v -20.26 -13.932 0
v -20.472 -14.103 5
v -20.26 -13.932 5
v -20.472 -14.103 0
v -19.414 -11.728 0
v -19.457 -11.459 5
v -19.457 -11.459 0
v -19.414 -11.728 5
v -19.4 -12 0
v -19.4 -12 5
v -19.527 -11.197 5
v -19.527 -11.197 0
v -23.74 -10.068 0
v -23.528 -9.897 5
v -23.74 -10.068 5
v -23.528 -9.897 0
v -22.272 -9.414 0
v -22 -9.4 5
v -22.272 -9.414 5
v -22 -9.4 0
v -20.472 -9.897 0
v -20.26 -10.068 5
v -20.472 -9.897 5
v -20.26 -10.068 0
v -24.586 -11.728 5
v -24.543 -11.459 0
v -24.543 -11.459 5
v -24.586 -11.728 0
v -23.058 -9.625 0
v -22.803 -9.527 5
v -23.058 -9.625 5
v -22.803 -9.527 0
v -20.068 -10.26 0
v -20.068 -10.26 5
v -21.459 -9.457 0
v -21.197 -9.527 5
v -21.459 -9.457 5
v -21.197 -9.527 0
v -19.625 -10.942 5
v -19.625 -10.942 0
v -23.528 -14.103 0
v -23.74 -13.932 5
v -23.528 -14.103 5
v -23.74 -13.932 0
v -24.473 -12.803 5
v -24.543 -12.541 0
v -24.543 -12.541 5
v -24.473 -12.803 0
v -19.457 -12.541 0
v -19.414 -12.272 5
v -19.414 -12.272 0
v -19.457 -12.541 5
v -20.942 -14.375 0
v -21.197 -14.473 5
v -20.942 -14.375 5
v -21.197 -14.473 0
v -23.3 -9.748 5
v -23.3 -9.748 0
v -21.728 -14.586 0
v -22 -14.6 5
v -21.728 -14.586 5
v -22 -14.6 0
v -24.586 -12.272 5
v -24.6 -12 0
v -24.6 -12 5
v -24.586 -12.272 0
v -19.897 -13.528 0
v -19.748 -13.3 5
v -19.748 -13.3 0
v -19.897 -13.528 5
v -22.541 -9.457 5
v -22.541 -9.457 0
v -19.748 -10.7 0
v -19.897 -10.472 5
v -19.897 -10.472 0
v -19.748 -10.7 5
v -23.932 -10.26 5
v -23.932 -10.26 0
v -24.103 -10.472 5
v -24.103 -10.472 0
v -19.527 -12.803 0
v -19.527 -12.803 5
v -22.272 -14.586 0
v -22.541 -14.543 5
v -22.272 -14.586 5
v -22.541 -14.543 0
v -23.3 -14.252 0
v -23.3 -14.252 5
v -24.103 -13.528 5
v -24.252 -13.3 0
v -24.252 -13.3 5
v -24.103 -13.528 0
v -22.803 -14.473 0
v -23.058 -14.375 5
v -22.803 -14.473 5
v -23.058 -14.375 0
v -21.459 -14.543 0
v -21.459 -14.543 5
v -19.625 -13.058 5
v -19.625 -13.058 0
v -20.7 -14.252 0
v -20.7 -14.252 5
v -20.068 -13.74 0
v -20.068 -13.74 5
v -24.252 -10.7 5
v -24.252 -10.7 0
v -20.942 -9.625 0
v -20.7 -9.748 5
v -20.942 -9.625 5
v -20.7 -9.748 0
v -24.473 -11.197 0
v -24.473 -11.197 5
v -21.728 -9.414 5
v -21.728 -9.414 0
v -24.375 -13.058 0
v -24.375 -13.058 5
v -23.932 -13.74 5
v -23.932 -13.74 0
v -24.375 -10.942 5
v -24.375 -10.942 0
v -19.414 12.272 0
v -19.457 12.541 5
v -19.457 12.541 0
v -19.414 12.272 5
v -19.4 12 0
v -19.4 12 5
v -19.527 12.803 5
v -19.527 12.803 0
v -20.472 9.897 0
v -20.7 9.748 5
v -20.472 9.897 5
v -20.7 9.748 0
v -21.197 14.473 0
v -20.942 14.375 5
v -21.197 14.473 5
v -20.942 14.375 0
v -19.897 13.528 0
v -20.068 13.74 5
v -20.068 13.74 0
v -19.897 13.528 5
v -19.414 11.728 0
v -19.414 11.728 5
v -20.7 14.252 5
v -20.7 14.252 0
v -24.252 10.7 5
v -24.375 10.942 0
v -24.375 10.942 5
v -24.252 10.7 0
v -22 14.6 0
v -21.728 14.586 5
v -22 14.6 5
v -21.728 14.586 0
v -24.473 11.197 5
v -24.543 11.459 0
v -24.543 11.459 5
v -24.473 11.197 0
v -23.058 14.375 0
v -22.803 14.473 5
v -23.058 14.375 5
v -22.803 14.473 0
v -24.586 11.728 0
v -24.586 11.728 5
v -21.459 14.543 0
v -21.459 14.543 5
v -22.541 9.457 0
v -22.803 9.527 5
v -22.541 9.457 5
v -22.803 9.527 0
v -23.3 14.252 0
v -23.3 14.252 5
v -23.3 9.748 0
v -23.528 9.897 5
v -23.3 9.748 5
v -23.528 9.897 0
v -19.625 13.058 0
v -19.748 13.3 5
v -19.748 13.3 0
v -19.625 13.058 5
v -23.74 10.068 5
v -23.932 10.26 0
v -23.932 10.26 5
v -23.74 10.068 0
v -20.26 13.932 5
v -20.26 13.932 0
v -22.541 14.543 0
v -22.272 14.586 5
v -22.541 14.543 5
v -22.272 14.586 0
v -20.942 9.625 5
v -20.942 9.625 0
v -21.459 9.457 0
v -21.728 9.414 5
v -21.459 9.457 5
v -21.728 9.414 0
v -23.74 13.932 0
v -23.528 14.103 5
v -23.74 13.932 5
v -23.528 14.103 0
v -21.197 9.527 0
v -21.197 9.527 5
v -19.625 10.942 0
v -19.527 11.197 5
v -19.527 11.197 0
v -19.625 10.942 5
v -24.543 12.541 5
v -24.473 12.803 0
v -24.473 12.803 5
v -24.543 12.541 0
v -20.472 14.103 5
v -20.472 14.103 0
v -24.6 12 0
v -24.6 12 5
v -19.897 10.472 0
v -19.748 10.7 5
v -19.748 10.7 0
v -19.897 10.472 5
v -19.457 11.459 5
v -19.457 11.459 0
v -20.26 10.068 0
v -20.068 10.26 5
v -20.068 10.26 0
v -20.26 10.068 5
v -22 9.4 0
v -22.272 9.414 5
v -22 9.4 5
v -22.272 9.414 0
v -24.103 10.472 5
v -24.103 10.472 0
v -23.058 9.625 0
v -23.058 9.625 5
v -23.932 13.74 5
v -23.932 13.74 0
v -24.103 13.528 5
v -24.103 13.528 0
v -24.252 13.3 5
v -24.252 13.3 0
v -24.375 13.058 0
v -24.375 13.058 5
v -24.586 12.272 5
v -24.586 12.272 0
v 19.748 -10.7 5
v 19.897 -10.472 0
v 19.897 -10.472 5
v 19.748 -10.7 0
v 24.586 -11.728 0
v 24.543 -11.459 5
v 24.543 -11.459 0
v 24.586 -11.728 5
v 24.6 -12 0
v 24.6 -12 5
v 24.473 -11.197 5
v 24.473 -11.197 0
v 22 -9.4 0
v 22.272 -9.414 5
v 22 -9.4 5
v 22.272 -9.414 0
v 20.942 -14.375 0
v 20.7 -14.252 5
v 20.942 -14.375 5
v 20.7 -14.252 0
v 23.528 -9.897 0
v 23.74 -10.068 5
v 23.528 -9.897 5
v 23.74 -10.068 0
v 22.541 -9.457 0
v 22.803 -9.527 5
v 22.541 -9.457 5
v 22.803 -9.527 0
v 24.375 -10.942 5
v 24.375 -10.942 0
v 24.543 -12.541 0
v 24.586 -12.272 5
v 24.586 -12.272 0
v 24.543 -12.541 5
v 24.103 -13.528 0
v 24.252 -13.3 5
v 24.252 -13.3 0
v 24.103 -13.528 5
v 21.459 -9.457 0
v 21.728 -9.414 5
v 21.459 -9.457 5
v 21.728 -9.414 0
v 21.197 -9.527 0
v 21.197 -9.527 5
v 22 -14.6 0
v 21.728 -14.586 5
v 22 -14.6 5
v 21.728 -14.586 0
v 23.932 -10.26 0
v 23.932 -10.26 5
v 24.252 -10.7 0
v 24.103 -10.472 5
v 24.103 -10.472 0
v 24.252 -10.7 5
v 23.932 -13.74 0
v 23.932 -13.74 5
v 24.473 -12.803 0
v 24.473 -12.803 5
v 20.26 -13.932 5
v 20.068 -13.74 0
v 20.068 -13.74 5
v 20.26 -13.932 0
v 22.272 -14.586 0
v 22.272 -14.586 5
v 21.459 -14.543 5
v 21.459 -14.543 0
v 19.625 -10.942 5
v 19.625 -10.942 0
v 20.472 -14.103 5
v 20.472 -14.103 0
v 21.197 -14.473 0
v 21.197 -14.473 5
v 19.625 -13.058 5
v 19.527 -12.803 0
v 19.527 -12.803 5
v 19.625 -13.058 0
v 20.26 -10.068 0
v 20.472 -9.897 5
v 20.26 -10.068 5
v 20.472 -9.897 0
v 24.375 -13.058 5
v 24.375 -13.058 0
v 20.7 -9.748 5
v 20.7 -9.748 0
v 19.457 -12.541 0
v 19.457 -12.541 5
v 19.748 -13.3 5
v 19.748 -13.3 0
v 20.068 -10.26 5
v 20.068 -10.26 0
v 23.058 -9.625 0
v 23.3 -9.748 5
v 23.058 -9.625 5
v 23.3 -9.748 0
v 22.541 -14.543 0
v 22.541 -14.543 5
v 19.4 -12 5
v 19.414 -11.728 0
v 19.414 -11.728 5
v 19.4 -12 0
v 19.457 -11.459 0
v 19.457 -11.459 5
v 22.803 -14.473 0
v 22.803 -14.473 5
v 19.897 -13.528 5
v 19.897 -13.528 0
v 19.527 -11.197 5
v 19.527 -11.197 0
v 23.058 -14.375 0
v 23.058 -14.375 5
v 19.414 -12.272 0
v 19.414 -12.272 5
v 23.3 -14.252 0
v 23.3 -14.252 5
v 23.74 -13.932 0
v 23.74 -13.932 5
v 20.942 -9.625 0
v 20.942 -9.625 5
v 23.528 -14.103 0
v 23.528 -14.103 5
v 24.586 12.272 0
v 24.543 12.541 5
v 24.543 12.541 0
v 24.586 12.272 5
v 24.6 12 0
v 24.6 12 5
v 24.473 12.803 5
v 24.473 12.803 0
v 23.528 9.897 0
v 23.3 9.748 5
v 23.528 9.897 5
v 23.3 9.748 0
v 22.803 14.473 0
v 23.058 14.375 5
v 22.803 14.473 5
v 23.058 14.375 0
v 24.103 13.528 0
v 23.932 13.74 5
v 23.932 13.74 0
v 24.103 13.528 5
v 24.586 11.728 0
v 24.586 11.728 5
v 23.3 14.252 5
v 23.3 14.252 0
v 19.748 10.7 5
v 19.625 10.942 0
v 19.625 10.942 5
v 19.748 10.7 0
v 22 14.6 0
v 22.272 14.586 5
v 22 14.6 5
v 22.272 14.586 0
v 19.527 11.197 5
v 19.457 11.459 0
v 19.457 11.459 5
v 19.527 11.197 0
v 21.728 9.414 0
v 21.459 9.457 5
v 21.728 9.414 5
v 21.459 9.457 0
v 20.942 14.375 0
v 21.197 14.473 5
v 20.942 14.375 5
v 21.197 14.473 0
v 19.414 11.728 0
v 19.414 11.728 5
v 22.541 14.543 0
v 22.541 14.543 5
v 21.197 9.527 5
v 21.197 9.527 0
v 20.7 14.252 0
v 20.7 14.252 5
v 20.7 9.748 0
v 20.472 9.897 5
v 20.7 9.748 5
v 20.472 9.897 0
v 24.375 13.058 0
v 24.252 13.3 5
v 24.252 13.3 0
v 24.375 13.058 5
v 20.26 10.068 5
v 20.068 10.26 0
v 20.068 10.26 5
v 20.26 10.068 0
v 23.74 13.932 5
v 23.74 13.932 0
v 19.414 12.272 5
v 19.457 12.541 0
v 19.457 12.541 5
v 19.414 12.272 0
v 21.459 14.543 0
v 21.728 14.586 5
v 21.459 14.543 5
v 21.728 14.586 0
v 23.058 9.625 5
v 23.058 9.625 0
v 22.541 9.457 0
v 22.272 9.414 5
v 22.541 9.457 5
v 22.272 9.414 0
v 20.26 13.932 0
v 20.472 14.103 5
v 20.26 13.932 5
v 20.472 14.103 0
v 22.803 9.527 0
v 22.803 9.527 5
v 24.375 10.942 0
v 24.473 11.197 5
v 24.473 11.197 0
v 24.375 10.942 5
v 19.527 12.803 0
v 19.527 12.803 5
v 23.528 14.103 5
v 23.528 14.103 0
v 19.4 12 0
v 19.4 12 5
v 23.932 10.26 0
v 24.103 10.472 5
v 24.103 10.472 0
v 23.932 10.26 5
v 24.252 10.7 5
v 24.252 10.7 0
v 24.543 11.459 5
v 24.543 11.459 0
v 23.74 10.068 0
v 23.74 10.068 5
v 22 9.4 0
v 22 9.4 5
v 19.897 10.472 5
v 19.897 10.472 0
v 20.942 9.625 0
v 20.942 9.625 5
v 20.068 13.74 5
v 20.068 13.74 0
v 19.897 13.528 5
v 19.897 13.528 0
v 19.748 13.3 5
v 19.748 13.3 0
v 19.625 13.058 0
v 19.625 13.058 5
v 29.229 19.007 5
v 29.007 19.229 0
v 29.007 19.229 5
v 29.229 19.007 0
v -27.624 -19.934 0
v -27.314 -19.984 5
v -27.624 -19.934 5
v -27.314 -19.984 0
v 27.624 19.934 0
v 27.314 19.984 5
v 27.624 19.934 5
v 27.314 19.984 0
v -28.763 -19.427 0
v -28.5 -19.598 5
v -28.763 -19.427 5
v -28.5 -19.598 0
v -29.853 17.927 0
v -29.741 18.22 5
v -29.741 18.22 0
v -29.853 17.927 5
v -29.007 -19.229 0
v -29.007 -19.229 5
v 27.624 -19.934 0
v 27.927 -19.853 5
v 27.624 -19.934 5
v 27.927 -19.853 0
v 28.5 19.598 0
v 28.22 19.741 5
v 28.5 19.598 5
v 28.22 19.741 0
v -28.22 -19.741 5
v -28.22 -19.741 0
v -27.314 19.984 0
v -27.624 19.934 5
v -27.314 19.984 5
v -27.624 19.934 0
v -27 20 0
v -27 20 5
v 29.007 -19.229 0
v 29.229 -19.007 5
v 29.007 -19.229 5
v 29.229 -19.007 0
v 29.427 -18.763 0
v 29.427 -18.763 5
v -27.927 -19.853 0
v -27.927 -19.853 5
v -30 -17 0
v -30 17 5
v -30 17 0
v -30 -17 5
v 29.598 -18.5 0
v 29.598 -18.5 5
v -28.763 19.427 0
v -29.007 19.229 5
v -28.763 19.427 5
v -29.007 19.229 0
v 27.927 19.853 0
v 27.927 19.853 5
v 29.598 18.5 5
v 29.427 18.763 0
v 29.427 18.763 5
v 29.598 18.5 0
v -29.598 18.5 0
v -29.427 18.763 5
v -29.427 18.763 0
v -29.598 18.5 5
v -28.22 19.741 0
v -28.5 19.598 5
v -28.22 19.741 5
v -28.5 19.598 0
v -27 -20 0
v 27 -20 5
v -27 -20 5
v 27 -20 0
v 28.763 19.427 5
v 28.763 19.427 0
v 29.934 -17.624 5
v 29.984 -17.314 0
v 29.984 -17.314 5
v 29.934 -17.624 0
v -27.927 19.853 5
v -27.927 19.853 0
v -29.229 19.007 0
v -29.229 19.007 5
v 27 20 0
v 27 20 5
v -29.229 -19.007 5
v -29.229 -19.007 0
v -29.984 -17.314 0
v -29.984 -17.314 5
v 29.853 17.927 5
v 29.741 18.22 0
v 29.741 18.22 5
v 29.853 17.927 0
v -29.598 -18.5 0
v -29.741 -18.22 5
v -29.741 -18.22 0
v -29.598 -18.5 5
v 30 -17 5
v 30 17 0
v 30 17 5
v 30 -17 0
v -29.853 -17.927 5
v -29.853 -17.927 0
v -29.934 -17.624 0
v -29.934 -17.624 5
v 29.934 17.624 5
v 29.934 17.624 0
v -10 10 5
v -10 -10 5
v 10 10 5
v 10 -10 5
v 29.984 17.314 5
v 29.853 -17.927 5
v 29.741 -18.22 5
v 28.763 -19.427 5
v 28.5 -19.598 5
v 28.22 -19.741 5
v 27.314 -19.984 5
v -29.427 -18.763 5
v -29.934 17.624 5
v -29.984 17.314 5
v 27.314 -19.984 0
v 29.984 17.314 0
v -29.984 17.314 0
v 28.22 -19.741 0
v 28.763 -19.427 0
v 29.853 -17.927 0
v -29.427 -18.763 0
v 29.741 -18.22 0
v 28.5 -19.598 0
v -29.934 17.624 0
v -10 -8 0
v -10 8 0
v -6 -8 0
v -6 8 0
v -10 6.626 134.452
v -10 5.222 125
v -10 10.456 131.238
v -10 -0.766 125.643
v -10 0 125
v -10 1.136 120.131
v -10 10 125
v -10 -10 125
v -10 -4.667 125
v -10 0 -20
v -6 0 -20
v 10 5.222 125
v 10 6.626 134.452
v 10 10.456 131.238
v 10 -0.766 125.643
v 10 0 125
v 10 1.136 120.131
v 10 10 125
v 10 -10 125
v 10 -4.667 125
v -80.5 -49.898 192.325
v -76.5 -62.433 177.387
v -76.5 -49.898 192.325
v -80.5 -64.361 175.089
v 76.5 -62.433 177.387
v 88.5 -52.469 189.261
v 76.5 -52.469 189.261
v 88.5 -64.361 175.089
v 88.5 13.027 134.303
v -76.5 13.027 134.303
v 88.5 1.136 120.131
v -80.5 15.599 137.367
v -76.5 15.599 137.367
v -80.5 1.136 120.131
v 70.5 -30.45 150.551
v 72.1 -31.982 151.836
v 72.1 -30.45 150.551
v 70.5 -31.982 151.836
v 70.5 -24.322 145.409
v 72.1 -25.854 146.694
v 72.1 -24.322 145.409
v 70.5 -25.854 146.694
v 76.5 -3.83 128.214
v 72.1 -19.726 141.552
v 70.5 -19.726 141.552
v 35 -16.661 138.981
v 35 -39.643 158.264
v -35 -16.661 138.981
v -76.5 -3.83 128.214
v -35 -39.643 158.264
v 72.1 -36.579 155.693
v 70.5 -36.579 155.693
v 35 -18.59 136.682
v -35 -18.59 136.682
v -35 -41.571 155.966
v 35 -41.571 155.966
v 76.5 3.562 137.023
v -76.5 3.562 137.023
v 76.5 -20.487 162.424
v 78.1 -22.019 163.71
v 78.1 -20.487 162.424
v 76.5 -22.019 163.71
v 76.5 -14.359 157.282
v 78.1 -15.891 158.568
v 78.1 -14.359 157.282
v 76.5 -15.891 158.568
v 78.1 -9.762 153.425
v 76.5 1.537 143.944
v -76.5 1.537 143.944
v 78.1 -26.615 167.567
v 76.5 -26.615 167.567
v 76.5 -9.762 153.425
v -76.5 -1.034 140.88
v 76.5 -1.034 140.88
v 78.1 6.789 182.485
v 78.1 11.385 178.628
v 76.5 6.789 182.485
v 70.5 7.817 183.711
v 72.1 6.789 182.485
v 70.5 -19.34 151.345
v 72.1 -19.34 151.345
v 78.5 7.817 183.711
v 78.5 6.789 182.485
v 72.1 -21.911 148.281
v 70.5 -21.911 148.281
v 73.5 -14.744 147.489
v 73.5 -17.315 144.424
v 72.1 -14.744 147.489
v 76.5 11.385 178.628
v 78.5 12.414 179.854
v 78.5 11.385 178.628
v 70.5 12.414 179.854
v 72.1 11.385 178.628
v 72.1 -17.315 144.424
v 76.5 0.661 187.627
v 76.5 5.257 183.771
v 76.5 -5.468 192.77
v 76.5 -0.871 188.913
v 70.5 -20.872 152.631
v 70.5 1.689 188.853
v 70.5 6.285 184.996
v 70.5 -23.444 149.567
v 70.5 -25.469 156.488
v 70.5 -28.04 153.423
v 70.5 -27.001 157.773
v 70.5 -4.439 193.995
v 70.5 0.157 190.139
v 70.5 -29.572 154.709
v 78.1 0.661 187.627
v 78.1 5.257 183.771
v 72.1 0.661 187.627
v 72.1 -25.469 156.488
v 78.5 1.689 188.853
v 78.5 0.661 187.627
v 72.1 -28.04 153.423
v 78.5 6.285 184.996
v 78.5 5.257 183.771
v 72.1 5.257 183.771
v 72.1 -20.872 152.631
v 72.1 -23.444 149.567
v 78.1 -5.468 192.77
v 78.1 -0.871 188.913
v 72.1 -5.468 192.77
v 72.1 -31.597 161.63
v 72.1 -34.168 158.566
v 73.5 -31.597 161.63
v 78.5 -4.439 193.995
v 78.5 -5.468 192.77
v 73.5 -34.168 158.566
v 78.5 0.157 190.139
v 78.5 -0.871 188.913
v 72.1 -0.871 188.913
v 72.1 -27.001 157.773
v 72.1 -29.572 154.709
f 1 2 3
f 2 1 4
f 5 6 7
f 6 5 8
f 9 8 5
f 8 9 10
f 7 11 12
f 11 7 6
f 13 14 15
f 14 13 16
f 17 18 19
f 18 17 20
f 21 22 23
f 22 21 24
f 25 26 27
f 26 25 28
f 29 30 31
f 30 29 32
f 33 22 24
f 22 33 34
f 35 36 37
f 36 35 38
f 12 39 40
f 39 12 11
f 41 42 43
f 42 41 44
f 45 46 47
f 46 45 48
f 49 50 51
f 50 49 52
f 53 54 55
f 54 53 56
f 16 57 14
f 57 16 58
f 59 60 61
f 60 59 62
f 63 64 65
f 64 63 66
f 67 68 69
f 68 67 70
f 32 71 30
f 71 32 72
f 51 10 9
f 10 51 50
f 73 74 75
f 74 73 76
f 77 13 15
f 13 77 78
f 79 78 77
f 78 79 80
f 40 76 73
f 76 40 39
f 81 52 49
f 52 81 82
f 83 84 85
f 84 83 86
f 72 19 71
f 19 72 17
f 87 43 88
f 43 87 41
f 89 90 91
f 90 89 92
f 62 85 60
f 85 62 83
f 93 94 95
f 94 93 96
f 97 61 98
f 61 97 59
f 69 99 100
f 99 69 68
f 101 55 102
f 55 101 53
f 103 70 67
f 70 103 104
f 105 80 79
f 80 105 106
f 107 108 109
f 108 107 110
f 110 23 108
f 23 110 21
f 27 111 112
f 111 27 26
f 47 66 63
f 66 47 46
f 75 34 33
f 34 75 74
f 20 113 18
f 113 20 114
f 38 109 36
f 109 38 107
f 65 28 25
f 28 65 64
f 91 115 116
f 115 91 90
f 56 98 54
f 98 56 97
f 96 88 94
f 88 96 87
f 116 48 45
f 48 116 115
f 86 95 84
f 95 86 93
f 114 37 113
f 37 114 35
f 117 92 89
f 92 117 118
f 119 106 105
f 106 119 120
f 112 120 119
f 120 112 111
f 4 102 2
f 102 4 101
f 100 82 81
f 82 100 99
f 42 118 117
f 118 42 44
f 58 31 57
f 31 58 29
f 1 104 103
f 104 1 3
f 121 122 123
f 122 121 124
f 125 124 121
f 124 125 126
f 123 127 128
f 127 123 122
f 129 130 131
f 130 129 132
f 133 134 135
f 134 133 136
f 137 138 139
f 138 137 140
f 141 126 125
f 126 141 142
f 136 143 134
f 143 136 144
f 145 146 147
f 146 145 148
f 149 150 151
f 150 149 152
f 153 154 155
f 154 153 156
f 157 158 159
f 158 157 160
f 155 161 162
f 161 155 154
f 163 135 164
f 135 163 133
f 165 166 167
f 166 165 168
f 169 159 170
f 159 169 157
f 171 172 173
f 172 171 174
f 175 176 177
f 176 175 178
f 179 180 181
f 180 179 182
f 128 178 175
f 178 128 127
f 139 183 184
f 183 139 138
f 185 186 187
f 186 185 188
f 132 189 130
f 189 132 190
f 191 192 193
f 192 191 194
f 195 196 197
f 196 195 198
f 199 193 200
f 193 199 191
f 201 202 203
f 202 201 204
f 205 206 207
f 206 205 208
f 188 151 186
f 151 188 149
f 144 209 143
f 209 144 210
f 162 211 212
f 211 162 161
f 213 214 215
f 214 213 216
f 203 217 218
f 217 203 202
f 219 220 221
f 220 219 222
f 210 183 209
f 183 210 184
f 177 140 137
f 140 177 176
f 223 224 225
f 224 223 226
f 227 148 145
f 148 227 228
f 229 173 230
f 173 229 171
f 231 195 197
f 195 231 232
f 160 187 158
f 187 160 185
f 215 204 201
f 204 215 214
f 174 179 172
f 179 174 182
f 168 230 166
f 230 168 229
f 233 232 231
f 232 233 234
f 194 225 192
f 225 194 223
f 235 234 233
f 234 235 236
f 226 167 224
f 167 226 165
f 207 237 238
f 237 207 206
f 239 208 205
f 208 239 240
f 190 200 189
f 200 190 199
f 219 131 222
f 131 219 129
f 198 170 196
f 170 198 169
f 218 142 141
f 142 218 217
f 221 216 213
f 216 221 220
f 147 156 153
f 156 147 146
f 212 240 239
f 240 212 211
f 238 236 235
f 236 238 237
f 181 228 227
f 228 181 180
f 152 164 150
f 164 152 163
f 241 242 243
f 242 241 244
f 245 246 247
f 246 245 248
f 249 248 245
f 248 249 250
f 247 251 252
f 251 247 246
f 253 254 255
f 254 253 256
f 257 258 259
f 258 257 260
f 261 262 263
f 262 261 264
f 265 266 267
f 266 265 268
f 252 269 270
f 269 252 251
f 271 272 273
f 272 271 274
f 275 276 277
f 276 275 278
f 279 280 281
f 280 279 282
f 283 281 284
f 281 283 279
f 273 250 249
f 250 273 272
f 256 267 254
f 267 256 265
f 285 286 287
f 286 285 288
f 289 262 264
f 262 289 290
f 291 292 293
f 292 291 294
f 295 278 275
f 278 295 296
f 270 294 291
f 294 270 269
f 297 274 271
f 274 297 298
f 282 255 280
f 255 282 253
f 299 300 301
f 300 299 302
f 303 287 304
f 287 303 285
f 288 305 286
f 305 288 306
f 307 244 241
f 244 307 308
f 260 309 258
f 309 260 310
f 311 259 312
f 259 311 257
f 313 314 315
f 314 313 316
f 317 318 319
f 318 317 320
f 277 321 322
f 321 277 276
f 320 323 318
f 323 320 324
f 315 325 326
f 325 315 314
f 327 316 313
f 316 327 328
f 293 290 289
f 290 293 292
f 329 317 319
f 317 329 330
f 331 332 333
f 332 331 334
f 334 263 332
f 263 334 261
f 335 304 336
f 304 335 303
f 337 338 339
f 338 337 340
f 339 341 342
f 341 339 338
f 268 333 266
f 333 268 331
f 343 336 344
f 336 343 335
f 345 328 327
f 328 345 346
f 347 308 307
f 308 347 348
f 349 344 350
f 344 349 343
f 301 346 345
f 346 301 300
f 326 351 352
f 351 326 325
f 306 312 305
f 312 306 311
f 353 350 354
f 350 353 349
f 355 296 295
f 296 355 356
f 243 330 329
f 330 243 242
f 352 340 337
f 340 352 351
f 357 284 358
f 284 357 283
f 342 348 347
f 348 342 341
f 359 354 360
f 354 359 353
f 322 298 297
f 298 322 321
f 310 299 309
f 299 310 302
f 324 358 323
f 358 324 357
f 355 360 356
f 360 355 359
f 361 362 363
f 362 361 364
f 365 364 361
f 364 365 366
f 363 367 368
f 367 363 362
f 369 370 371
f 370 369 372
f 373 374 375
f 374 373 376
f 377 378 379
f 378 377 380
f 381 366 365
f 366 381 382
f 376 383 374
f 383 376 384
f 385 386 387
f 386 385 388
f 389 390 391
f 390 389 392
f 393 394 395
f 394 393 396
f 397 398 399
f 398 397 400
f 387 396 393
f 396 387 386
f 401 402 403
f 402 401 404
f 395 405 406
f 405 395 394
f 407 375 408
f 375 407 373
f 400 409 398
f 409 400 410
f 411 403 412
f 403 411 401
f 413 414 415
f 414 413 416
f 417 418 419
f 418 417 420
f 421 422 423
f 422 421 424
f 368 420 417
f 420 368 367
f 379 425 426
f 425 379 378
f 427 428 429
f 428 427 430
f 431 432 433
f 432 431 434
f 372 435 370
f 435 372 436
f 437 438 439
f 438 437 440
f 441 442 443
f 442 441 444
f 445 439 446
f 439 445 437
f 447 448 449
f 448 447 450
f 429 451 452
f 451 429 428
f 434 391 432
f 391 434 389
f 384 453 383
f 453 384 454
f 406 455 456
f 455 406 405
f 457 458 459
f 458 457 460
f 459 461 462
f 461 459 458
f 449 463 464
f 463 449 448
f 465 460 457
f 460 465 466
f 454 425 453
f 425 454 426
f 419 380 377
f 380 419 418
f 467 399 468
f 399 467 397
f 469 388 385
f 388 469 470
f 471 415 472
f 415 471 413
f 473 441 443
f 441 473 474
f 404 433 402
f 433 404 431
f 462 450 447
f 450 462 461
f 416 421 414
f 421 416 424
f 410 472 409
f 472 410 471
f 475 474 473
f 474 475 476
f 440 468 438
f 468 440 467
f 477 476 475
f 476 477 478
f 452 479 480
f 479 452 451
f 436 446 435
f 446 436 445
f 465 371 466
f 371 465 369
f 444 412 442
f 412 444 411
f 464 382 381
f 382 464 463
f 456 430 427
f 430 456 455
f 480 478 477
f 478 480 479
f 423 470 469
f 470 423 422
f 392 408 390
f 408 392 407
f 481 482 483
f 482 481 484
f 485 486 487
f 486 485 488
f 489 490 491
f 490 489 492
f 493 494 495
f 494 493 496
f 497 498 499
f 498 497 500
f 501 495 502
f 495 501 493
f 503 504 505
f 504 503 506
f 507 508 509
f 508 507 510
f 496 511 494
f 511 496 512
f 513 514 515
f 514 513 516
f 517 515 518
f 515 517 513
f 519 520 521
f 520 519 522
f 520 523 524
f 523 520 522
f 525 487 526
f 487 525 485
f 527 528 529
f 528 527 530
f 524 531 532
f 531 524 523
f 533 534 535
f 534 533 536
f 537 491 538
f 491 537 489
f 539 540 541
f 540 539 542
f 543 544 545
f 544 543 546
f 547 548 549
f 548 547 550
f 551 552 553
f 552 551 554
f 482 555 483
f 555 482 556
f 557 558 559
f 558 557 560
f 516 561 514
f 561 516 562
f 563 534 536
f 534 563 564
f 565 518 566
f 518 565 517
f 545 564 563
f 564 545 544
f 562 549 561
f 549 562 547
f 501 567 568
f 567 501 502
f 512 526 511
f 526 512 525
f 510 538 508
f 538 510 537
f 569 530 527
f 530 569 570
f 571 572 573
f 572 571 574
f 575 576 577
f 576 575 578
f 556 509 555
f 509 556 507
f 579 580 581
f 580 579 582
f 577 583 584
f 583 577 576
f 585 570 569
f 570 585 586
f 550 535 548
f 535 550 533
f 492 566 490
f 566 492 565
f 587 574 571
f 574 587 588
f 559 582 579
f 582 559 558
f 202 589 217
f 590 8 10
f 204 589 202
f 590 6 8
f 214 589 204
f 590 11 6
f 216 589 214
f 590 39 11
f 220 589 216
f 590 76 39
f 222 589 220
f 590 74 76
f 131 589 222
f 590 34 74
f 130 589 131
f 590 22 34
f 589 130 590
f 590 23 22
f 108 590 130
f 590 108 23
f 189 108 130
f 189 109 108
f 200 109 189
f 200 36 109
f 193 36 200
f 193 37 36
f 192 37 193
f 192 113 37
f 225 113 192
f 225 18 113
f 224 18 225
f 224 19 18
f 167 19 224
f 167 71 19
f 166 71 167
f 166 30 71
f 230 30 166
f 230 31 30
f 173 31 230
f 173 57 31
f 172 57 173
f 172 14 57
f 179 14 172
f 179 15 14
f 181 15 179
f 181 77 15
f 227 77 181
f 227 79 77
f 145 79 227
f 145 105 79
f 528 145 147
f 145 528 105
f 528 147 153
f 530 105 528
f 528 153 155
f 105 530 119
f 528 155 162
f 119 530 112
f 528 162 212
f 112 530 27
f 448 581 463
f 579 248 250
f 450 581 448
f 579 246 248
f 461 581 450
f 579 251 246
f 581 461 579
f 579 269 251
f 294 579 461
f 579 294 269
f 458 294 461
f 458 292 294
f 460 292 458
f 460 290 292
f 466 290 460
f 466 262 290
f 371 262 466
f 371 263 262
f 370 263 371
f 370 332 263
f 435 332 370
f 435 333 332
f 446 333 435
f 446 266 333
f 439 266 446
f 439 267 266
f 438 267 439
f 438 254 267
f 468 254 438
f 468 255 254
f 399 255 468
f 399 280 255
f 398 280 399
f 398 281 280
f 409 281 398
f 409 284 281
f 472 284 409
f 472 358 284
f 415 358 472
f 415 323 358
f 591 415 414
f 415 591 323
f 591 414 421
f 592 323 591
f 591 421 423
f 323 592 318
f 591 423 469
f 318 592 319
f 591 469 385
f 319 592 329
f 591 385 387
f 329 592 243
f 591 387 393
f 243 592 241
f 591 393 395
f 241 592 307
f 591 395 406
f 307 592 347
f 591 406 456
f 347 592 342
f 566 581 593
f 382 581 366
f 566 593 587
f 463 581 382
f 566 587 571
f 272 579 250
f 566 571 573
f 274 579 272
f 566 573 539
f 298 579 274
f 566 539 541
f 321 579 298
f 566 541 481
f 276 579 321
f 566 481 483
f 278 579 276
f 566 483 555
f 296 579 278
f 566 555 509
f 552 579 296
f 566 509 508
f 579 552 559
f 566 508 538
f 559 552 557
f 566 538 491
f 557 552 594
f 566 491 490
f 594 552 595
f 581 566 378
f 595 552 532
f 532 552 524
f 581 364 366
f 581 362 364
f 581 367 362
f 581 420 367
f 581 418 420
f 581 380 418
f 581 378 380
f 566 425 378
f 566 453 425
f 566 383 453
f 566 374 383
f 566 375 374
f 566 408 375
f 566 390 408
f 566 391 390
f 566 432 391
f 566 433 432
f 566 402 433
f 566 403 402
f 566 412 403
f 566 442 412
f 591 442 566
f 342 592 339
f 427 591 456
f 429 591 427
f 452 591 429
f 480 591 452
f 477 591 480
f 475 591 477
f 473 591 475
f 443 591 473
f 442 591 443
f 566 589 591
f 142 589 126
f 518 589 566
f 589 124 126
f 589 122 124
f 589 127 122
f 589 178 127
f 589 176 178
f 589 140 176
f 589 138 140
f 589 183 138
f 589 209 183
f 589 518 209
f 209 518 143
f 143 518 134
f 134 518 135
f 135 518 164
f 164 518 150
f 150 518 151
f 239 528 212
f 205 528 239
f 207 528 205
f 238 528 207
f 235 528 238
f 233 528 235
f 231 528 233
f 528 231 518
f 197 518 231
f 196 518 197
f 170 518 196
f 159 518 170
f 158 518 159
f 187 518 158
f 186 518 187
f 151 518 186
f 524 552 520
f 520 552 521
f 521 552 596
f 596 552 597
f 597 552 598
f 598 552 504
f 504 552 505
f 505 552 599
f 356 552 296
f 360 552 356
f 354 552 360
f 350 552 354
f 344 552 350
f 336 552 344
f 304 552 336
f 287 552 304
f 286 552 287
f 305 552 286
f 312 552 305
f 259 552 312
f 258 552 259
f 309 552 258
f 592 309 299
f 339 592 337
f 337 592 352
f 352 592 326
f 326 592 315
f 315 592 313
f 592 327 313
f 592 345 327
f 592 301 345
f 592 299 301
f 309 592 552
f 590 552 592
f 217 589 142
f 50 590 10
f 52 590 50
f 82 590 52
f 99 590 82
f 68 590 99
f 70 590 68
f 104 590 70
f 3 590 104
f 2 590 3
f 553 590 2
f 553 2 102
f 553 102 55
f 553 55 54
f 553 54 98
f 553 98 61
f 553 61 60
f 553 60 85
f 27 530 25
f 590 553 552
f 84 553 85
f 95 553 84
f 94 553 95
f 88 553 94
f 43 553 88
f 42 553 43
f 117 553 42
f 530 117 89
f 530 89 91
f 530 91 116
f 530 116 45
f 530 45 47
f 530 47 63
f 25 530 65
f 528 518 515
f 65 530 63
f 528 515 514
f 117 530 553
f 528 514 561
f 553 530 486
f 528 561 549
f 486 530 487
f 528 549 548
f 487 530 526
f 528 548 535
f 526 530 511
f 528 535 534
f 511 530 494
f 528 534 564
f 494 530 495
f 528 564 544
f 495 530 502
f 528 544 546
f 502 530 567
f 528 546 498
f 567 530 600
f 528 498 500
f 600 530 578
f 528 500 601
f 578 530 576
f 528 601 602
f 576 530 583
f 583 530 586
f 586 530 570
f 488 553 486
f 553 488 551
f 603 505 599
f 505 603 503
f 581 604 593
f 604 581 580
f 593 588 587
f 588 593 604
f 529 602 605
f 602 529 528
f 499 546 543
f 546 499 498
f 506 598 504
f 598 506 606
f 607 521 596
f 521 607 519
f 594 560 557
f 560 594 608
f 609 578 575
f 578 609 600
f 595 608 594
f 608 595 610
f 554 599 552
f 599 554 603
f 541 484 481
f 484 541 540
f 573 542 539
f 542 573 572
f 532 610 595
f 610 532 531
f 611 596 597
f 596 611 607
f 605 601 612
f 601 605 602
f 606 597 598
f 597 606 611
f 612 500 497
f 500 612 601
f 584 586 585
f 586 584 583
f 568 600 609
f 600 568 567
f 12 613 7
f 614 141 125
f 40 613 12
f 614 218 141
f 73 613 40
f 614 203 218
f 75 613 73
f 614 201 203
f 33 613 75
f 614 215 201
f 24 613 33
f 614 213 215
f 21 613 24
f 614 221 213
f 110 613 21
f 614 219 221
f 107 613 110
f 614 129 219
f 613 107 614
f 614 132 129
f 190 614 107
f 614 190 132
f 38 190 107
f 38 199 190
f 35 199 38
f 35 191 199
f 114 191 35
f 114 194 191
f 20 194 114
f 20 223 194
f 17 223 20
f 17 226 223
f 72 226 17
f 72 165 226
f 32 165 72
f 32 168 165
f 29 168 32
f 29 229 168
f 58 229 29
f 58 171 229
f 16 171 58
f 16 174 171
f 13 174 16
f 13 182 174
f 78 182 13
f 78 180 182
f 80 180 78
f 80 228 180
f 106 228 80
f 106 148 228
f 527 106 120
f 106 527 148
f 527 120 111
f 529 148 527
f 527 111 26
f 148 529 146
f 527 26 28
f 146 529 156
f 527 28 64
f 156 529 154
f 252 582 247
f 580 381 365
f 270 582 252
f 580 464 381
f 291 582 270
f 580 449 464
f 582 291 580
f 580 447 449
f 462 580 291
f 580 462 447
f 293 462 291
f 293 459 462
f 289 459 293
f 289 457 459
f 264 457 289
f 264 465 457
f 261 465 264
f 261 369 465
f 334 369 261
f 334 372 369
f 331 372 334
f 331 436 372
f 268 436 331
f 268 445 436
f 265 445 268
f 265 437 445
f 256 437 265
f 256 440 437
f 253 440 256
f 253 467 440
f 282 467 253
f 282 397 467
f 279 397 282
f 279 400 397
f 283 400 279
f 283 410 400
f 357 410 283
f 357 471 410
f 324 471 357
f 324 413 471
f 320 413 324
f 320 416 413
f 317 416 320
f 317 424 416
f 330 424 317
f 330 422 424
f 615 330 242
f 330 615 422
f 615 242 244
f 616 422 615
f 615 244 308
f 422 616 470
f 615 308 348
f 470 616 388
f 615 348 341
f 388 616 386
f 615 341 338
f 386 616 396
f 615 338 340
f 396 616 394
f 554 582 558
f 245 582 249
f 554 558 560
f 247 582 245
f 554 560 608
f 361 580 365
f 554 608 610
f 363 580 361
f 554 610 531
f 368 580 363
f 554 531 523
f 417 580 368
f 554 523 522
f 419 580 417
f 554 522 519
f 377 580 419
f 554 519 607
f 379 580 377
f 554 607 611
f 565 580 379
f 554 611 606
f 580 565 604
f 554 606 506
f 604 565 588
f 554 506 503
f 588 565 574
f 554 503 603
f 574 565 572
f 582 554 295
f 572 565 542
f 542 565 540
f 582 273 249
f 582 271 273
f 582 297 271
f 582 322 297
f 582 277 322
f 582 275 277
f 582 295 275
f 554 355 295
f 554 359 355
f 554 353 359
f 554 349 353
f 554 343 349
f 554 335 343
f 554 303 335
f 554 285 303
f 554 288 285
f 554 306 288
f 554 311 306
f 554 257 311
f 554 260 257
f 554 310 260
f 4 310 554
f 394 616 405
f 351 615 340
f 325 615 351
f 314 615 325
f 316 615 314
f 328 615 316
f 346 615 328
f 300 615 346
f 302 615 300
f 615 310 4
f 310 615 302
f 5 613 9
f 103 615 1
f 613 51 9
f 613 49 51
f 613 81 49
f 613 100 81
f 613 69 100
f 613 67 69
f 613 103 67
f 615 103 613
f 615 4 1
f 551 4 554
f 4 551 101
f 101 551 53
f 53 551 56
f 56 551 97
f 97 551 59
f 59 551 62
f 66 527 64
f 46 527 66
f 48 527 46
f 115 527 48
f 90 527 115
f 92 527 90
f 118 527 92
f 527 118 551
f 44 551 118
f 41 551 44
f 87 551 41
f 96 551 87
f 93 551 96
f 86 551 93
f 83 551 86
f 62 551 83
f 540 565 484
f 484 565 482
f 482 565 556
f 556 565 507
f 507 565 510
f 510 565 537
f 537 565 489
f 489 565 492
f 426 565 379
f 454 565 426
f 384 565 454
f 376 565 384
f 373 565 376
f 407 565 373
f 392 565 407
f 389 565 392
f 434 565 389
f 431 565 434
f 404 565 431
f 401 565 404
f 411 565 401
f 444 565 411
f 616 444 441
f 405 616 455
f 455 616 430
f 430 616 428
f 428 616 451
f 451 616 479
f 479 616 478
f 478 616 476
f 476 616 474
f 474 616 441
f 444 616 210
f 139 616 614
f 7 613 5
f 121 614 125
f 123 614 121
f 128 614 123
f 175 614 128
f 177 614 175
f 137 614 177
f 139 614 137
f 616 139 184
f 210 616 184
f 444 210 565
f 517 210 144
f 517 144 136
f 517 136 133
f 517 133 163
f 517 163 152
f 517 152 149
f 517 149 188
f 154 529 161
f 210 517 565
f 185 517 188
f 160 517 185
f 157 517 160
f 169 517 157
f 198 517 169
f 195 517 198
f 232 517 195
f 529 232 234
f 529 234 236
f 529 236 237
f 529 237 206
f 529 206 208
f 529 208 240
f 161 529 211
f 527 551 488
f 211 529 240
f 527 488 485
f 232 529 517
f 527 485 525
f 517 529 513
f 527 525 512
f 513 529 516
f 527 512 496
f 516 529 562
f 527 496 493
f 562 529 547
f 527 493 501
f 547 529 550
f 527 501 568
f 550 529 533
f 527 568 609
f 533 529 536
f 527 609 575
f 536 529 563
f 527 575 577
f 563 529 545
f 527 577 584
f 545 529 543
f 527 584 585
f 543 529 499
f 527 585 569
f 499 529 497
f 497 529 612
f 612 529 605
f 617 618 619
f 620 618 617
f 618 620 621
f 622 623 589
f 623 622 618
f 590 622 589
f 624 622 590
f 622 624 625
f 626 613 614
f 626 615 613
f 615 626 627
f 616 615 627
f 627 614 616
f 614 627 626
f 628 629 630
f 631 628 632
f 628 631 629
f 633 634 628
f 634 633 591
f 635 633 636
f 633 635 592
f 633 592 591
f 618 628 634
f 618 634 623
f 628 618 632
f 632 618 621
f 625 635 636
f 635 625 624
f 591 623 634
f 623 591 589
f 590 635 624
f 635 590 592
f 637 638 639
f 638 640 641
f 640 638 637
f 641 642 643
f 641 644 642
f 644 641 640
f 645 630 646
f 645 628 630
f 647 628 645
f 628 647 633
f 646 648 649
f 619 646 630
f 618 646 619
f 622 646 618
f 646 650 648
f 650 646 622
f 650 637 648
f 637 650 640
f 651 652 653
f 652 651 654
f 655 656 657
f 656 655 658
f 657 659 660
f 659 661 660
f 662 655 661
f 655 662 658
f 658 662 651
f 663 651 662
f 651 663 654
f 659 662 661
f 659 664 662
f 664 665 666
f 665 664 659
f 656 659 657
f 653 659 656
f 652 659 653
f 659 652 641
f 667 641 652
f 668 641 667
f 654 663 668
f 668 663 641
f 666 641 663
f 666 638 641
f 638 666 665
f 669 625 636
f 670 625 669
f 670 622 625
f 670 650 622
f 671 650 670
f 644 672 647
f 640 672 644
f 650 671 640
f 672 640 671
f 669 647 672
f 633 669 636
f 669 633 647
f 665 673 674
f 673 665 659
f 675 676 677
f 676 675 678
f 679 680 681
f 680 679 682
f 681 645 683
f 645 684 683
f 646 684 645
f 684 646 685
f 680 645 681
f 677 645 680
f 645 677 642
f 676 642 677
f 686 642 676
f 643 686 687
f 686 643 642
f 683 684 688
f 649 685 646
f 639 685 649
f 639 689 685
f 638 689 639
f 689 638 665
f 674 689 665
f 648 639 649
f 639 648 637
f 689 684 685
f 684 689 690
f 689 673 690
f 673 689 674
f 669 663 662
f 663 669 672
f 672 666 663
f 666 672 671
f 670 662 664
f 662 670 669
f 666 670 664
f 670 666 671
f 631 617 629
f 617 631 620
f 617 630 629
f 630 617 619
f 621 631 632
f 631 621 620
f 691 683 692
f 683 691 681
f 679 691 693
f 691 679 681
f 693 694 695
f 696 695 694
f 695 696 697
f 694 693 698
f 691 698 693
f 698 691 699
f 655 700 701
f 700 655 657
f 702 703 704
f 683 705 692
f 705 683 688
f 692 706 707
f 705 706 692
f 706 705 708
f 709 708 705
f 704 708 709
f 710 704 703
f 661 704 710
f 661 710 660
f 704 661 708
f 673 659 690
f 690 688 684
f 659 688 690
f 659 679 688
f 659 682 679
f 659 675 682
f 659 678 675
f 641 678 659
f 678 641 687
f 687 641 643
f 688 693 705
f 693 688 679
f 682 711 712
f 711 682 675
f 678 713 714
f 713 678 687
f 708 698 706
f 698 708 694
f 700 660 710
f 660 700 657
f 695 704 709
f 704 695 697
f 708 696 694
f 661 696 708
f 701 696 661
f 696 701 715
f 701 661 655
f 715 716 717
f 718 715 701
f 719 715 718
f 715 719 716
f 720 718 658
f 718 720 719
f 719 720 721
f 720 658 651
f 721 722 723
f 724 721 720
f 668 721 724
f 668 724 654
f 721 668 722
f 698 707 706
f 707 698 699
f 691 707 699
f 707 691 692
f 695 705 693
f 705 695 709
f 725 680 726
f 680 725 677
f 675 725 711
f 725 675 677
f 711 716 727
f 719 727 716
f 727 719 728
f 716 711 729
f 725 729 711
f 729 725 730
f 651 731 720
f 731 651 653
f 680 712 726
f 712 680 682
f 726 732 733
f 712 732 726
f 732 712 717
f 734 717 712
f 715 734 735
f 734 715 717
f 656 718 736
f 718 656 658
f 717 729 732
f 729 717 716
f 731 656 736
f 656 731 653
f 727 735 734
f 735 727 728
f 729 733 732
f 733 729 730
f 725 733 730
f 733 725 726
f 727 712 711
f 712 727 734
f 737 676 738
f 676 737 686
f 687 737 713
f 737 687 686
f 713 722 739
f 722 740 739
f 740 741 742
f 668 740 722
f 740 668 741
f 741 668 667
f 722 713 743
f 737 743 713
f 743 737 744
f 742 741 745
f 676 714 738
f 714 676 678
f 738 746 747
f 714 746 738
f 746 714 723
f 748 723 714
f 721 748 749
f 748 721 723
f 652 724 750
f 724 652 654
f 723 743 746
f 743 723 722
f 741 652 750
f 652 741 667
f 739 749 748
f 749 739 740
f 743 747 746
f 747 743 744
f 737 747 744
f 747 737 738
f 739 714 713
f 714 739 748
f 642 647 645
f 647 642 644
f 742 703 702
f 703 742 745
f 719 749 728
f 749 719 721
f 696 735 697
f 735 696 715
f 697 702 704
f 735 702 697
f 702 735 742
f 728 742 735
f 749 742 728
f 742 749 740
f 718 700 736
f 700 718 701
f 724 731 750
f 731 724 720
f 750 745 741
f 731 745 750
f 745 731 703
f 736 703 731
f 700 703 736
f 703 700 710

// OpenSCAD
// =============================================================
// CoreML-Robot: iPhone 17 Pro Mount (Head)
// =============================================================
// Spring-loaded cradle that holds the iPhone horizontally
// (landscape). A fixed L-shelf on one side and a flexure-spring
// jaw on the other clamp the phone. The phone slides in from
// the top against the spring jaw.
//
// Mounts on a post above and behind the robot arm so the rear
// camera has a clear view of the workspace.
//
// Print: 0.2mm layer, 40% infill.
//        Print upright (post vertical). No supports needed.
//        The flex spring should be printed in PETG or PLA+
//        for fatigue resistance. Regular PLA works but the
//        spring may weaken over many cycles.
// =============================================================

$fn = 60;

// --- iPhone 17 Pro dimensions (landscape orientation) ---
// Width in landscape = phone height, Height in landscape = phone width
phone_w     = 150.0;  // iPhone 17 Pro height (now horizontal span)
phone_h     = 72.0;   // iPhone 17 Pro width (now vertical span)
phone_d     = 8.5;    // thickness (with slight tolerance for thin case)
tolerance   = 1.5;    // extra room on each side

// Cradle internal dimensions
cradle_w = phone_w + tolerance * 2;  // horizontal opening
cradle_h = phone_h + tolerance;      // vertical depth (open top)
cradle_d = phone_d + tolerance * 2;  // thickness slot

// Cradle structure
wall         = 4.0;
lip          = 8.0;   // how far the front lip extends over the phone face
bottom_shelf = 5.0;   // ledge the phone rests on
back_wall    = 3.0;   // wall behind the phone

// Flex spring jaw
spring_arm_count  = 3;     // number of parallel spring fingers
spring_arm_w      = 6.0;   // width of each finger
spring_arm_t      = 1.6;   // thickness (controls spring force)
spring_arm_l      = 50.0;  // length of flex arm (longer = softer)
spring_travel     = 8.0;   // how far the spring compresses
spring_gap        = 2.0;   // gap between fingers

// Post (connects to base)
post_height  = 120;  // tall enough to look over the arm
post_width   = 20;
post_depth   = 20;

// Base mount plate (screws to the robot base)
mount_plate_w = 60;
mount_plate_d = 40;
mount_plate_h = 5;
mount_hole_d  = 5.2;  // M5

// Tilt angle (camera looks down at workspace)
tilt_angle = 50;  // degrees from vertical


// ==================== MODULES ====================

module mount_base_plate() {
    difference() {
        // Plate
        translate([-mount_plate_w/2, -mount_plate_d/2, 0])
            hull() {
                for (x = [3, mount_plate_w - 3])
                    for (y = [3, mount_plate_d - 3])
                        translate([x, y, 0])
                            cylinder(r=3, h=mount_plate_h);
            }

        // Mounting holes
        for (x = [-mount_plate_w/2 + 8, mount_plate_w/2 - 8])
            for (y = [-mount_plate_d/2 + 8, mount_plate_d/2 - 8])
                translate([x, y, -1])
                    cylinder(d=mount_hole_d, h=mount_plate_h + 2);
    }
}

module post() {
    translate([-post_width/2, -post_depth/2, mount_plate_h])
        cube([post_width, post_depth, post_height]);

    // Gussets at base of post for rigidity
    gusset_h = 25;
    for (side = [-1, 1]) {
        translate([side * post_width/2, 0, mount_plate_h])
            rotate([0, side * -90, 0])
                linear_extrude(height=wall)
                    polygon([[0, -post_depth/2],
                             [0, post_depth/2],
                             [gusset_h, 0]]);
    }
}

module phone_cradle() {
    // Positioned at top of post, tilted forward
    translate([0, 0, mount_plate_h + post_height])
    rotate([tilt_angle, 0, 0]) {
        difference() {
            union() {
                // Back wall
                translate([-cradle_w/2 - wall, -back_wall, -wall])
                    cube([cradle_w + 2*wall, back_wall, cradle_h + wall + lip]);

                // Bottom shelf
                translate([-cradle_w/2 - wall, -back_wall, -wall])
                    cube([cradle_w + 2*wall, back_wall + cradle_d + wall, bottom_shelf + wall]);

                // Fixed side wall (left)
                translate([-cradle_w/2 - wall, -back_wall, -wall])
                    cube([wall, back_wall + cradle_d + lip, cradle_h + wall + lip]);

                // Front lip (bottom part, holds phone from falling forward)
                translate([-cradle_w/2 - wall, cradle_d, -wall])
                    cube([cradle_w + 2*wall, wall, bottom_shelf + wall + 6]);
            }

            // Camera cutout in back wall (for rear cameras)
            translate([-35, -back_wall - 1, cradle_h/2 - 15])
                cube([70, back_wall + 2, 30]);

            // Charging port cutout in bottom shelf
            translate([-10, 0, -wall - 1])
                cube([20, cradle_d, wall + 2]);
        }

        // Spring jaw (right side) — clamping mechanism
        translate([cradle_w/2, 0, 0])
            spring_jaw();
    }
}

module spring_jaw() {
    // The spring jaw is a set of cantilevered flex arms that push
    // inward against the phone. They bend outward when the phone
    // is inserted, providing clamping force.

    total_spring_h = spring_arm_count * spring_arm_w +
                     (spring_arm_count - 1) * spring_gap;
    start_z = (cradle_h - total_spring_h) / 2;

    // Anchor block (fixed to cradle)
    translate([0, -back_wall, -wall])
        cube([wall + spring_travel, back_wall + cradle_d + wall, cradle_h + wall + lip]);

    // Flex spring fingers
    for (i = [0:spring_arm_count - 1]) {
        z = start_z + i * (spring_arm_w + spring_gap);

        // Each finger is a U-shaped cantilever:
        // anchored at the right wall, curves back left to press on phone
        translate([0, cradle_d + wall, z])
            spring_finger(z);
    }

    // Contact bar (connects all finger tips for even pressure)
    translate([-(spring_travel - 2), cradle_d/2 - 2, start_z])
        cube([3, 4, total_spring_h]);
}

module spring_finger(z_pos) {
    // Single flex finger: goes from anchor, forward, then curves
    // back to create a spring that pushes inward.
    //
    // Geometry (top view, X = left-right, Y = front-back):
    //   Anchor (right) → extends forward → bends left → tip pushes on phone

    // Outward arm (along Y, from anchor toward front)
    translate([0, -cradle_d - wall, 0])
        cube([spring_arm_t, spring_arm_l, spring_arm_w]);

    // Return arm (comes back inward, creating the spring)
    translate([-(spring_travel - 2), -cradle_d - wall, 0])
        cube([spring_arm_t, spring_arm_l, spring_arm_w]);

    // Connecting bridge at the far end
    translate([-(spring_travel - 2), -cradle_d - wall + spring_arm_l - spring_arm_t, 0])
        cube([spring_travel, spring_arm_t, spring_arm_w]);
}


// ==================== ASSEMBLY ====================

color("DarkSlateGray") {
    mount_base_plate();
    post();
}

color("ForestGreen") {
    phone_cradle();
}
